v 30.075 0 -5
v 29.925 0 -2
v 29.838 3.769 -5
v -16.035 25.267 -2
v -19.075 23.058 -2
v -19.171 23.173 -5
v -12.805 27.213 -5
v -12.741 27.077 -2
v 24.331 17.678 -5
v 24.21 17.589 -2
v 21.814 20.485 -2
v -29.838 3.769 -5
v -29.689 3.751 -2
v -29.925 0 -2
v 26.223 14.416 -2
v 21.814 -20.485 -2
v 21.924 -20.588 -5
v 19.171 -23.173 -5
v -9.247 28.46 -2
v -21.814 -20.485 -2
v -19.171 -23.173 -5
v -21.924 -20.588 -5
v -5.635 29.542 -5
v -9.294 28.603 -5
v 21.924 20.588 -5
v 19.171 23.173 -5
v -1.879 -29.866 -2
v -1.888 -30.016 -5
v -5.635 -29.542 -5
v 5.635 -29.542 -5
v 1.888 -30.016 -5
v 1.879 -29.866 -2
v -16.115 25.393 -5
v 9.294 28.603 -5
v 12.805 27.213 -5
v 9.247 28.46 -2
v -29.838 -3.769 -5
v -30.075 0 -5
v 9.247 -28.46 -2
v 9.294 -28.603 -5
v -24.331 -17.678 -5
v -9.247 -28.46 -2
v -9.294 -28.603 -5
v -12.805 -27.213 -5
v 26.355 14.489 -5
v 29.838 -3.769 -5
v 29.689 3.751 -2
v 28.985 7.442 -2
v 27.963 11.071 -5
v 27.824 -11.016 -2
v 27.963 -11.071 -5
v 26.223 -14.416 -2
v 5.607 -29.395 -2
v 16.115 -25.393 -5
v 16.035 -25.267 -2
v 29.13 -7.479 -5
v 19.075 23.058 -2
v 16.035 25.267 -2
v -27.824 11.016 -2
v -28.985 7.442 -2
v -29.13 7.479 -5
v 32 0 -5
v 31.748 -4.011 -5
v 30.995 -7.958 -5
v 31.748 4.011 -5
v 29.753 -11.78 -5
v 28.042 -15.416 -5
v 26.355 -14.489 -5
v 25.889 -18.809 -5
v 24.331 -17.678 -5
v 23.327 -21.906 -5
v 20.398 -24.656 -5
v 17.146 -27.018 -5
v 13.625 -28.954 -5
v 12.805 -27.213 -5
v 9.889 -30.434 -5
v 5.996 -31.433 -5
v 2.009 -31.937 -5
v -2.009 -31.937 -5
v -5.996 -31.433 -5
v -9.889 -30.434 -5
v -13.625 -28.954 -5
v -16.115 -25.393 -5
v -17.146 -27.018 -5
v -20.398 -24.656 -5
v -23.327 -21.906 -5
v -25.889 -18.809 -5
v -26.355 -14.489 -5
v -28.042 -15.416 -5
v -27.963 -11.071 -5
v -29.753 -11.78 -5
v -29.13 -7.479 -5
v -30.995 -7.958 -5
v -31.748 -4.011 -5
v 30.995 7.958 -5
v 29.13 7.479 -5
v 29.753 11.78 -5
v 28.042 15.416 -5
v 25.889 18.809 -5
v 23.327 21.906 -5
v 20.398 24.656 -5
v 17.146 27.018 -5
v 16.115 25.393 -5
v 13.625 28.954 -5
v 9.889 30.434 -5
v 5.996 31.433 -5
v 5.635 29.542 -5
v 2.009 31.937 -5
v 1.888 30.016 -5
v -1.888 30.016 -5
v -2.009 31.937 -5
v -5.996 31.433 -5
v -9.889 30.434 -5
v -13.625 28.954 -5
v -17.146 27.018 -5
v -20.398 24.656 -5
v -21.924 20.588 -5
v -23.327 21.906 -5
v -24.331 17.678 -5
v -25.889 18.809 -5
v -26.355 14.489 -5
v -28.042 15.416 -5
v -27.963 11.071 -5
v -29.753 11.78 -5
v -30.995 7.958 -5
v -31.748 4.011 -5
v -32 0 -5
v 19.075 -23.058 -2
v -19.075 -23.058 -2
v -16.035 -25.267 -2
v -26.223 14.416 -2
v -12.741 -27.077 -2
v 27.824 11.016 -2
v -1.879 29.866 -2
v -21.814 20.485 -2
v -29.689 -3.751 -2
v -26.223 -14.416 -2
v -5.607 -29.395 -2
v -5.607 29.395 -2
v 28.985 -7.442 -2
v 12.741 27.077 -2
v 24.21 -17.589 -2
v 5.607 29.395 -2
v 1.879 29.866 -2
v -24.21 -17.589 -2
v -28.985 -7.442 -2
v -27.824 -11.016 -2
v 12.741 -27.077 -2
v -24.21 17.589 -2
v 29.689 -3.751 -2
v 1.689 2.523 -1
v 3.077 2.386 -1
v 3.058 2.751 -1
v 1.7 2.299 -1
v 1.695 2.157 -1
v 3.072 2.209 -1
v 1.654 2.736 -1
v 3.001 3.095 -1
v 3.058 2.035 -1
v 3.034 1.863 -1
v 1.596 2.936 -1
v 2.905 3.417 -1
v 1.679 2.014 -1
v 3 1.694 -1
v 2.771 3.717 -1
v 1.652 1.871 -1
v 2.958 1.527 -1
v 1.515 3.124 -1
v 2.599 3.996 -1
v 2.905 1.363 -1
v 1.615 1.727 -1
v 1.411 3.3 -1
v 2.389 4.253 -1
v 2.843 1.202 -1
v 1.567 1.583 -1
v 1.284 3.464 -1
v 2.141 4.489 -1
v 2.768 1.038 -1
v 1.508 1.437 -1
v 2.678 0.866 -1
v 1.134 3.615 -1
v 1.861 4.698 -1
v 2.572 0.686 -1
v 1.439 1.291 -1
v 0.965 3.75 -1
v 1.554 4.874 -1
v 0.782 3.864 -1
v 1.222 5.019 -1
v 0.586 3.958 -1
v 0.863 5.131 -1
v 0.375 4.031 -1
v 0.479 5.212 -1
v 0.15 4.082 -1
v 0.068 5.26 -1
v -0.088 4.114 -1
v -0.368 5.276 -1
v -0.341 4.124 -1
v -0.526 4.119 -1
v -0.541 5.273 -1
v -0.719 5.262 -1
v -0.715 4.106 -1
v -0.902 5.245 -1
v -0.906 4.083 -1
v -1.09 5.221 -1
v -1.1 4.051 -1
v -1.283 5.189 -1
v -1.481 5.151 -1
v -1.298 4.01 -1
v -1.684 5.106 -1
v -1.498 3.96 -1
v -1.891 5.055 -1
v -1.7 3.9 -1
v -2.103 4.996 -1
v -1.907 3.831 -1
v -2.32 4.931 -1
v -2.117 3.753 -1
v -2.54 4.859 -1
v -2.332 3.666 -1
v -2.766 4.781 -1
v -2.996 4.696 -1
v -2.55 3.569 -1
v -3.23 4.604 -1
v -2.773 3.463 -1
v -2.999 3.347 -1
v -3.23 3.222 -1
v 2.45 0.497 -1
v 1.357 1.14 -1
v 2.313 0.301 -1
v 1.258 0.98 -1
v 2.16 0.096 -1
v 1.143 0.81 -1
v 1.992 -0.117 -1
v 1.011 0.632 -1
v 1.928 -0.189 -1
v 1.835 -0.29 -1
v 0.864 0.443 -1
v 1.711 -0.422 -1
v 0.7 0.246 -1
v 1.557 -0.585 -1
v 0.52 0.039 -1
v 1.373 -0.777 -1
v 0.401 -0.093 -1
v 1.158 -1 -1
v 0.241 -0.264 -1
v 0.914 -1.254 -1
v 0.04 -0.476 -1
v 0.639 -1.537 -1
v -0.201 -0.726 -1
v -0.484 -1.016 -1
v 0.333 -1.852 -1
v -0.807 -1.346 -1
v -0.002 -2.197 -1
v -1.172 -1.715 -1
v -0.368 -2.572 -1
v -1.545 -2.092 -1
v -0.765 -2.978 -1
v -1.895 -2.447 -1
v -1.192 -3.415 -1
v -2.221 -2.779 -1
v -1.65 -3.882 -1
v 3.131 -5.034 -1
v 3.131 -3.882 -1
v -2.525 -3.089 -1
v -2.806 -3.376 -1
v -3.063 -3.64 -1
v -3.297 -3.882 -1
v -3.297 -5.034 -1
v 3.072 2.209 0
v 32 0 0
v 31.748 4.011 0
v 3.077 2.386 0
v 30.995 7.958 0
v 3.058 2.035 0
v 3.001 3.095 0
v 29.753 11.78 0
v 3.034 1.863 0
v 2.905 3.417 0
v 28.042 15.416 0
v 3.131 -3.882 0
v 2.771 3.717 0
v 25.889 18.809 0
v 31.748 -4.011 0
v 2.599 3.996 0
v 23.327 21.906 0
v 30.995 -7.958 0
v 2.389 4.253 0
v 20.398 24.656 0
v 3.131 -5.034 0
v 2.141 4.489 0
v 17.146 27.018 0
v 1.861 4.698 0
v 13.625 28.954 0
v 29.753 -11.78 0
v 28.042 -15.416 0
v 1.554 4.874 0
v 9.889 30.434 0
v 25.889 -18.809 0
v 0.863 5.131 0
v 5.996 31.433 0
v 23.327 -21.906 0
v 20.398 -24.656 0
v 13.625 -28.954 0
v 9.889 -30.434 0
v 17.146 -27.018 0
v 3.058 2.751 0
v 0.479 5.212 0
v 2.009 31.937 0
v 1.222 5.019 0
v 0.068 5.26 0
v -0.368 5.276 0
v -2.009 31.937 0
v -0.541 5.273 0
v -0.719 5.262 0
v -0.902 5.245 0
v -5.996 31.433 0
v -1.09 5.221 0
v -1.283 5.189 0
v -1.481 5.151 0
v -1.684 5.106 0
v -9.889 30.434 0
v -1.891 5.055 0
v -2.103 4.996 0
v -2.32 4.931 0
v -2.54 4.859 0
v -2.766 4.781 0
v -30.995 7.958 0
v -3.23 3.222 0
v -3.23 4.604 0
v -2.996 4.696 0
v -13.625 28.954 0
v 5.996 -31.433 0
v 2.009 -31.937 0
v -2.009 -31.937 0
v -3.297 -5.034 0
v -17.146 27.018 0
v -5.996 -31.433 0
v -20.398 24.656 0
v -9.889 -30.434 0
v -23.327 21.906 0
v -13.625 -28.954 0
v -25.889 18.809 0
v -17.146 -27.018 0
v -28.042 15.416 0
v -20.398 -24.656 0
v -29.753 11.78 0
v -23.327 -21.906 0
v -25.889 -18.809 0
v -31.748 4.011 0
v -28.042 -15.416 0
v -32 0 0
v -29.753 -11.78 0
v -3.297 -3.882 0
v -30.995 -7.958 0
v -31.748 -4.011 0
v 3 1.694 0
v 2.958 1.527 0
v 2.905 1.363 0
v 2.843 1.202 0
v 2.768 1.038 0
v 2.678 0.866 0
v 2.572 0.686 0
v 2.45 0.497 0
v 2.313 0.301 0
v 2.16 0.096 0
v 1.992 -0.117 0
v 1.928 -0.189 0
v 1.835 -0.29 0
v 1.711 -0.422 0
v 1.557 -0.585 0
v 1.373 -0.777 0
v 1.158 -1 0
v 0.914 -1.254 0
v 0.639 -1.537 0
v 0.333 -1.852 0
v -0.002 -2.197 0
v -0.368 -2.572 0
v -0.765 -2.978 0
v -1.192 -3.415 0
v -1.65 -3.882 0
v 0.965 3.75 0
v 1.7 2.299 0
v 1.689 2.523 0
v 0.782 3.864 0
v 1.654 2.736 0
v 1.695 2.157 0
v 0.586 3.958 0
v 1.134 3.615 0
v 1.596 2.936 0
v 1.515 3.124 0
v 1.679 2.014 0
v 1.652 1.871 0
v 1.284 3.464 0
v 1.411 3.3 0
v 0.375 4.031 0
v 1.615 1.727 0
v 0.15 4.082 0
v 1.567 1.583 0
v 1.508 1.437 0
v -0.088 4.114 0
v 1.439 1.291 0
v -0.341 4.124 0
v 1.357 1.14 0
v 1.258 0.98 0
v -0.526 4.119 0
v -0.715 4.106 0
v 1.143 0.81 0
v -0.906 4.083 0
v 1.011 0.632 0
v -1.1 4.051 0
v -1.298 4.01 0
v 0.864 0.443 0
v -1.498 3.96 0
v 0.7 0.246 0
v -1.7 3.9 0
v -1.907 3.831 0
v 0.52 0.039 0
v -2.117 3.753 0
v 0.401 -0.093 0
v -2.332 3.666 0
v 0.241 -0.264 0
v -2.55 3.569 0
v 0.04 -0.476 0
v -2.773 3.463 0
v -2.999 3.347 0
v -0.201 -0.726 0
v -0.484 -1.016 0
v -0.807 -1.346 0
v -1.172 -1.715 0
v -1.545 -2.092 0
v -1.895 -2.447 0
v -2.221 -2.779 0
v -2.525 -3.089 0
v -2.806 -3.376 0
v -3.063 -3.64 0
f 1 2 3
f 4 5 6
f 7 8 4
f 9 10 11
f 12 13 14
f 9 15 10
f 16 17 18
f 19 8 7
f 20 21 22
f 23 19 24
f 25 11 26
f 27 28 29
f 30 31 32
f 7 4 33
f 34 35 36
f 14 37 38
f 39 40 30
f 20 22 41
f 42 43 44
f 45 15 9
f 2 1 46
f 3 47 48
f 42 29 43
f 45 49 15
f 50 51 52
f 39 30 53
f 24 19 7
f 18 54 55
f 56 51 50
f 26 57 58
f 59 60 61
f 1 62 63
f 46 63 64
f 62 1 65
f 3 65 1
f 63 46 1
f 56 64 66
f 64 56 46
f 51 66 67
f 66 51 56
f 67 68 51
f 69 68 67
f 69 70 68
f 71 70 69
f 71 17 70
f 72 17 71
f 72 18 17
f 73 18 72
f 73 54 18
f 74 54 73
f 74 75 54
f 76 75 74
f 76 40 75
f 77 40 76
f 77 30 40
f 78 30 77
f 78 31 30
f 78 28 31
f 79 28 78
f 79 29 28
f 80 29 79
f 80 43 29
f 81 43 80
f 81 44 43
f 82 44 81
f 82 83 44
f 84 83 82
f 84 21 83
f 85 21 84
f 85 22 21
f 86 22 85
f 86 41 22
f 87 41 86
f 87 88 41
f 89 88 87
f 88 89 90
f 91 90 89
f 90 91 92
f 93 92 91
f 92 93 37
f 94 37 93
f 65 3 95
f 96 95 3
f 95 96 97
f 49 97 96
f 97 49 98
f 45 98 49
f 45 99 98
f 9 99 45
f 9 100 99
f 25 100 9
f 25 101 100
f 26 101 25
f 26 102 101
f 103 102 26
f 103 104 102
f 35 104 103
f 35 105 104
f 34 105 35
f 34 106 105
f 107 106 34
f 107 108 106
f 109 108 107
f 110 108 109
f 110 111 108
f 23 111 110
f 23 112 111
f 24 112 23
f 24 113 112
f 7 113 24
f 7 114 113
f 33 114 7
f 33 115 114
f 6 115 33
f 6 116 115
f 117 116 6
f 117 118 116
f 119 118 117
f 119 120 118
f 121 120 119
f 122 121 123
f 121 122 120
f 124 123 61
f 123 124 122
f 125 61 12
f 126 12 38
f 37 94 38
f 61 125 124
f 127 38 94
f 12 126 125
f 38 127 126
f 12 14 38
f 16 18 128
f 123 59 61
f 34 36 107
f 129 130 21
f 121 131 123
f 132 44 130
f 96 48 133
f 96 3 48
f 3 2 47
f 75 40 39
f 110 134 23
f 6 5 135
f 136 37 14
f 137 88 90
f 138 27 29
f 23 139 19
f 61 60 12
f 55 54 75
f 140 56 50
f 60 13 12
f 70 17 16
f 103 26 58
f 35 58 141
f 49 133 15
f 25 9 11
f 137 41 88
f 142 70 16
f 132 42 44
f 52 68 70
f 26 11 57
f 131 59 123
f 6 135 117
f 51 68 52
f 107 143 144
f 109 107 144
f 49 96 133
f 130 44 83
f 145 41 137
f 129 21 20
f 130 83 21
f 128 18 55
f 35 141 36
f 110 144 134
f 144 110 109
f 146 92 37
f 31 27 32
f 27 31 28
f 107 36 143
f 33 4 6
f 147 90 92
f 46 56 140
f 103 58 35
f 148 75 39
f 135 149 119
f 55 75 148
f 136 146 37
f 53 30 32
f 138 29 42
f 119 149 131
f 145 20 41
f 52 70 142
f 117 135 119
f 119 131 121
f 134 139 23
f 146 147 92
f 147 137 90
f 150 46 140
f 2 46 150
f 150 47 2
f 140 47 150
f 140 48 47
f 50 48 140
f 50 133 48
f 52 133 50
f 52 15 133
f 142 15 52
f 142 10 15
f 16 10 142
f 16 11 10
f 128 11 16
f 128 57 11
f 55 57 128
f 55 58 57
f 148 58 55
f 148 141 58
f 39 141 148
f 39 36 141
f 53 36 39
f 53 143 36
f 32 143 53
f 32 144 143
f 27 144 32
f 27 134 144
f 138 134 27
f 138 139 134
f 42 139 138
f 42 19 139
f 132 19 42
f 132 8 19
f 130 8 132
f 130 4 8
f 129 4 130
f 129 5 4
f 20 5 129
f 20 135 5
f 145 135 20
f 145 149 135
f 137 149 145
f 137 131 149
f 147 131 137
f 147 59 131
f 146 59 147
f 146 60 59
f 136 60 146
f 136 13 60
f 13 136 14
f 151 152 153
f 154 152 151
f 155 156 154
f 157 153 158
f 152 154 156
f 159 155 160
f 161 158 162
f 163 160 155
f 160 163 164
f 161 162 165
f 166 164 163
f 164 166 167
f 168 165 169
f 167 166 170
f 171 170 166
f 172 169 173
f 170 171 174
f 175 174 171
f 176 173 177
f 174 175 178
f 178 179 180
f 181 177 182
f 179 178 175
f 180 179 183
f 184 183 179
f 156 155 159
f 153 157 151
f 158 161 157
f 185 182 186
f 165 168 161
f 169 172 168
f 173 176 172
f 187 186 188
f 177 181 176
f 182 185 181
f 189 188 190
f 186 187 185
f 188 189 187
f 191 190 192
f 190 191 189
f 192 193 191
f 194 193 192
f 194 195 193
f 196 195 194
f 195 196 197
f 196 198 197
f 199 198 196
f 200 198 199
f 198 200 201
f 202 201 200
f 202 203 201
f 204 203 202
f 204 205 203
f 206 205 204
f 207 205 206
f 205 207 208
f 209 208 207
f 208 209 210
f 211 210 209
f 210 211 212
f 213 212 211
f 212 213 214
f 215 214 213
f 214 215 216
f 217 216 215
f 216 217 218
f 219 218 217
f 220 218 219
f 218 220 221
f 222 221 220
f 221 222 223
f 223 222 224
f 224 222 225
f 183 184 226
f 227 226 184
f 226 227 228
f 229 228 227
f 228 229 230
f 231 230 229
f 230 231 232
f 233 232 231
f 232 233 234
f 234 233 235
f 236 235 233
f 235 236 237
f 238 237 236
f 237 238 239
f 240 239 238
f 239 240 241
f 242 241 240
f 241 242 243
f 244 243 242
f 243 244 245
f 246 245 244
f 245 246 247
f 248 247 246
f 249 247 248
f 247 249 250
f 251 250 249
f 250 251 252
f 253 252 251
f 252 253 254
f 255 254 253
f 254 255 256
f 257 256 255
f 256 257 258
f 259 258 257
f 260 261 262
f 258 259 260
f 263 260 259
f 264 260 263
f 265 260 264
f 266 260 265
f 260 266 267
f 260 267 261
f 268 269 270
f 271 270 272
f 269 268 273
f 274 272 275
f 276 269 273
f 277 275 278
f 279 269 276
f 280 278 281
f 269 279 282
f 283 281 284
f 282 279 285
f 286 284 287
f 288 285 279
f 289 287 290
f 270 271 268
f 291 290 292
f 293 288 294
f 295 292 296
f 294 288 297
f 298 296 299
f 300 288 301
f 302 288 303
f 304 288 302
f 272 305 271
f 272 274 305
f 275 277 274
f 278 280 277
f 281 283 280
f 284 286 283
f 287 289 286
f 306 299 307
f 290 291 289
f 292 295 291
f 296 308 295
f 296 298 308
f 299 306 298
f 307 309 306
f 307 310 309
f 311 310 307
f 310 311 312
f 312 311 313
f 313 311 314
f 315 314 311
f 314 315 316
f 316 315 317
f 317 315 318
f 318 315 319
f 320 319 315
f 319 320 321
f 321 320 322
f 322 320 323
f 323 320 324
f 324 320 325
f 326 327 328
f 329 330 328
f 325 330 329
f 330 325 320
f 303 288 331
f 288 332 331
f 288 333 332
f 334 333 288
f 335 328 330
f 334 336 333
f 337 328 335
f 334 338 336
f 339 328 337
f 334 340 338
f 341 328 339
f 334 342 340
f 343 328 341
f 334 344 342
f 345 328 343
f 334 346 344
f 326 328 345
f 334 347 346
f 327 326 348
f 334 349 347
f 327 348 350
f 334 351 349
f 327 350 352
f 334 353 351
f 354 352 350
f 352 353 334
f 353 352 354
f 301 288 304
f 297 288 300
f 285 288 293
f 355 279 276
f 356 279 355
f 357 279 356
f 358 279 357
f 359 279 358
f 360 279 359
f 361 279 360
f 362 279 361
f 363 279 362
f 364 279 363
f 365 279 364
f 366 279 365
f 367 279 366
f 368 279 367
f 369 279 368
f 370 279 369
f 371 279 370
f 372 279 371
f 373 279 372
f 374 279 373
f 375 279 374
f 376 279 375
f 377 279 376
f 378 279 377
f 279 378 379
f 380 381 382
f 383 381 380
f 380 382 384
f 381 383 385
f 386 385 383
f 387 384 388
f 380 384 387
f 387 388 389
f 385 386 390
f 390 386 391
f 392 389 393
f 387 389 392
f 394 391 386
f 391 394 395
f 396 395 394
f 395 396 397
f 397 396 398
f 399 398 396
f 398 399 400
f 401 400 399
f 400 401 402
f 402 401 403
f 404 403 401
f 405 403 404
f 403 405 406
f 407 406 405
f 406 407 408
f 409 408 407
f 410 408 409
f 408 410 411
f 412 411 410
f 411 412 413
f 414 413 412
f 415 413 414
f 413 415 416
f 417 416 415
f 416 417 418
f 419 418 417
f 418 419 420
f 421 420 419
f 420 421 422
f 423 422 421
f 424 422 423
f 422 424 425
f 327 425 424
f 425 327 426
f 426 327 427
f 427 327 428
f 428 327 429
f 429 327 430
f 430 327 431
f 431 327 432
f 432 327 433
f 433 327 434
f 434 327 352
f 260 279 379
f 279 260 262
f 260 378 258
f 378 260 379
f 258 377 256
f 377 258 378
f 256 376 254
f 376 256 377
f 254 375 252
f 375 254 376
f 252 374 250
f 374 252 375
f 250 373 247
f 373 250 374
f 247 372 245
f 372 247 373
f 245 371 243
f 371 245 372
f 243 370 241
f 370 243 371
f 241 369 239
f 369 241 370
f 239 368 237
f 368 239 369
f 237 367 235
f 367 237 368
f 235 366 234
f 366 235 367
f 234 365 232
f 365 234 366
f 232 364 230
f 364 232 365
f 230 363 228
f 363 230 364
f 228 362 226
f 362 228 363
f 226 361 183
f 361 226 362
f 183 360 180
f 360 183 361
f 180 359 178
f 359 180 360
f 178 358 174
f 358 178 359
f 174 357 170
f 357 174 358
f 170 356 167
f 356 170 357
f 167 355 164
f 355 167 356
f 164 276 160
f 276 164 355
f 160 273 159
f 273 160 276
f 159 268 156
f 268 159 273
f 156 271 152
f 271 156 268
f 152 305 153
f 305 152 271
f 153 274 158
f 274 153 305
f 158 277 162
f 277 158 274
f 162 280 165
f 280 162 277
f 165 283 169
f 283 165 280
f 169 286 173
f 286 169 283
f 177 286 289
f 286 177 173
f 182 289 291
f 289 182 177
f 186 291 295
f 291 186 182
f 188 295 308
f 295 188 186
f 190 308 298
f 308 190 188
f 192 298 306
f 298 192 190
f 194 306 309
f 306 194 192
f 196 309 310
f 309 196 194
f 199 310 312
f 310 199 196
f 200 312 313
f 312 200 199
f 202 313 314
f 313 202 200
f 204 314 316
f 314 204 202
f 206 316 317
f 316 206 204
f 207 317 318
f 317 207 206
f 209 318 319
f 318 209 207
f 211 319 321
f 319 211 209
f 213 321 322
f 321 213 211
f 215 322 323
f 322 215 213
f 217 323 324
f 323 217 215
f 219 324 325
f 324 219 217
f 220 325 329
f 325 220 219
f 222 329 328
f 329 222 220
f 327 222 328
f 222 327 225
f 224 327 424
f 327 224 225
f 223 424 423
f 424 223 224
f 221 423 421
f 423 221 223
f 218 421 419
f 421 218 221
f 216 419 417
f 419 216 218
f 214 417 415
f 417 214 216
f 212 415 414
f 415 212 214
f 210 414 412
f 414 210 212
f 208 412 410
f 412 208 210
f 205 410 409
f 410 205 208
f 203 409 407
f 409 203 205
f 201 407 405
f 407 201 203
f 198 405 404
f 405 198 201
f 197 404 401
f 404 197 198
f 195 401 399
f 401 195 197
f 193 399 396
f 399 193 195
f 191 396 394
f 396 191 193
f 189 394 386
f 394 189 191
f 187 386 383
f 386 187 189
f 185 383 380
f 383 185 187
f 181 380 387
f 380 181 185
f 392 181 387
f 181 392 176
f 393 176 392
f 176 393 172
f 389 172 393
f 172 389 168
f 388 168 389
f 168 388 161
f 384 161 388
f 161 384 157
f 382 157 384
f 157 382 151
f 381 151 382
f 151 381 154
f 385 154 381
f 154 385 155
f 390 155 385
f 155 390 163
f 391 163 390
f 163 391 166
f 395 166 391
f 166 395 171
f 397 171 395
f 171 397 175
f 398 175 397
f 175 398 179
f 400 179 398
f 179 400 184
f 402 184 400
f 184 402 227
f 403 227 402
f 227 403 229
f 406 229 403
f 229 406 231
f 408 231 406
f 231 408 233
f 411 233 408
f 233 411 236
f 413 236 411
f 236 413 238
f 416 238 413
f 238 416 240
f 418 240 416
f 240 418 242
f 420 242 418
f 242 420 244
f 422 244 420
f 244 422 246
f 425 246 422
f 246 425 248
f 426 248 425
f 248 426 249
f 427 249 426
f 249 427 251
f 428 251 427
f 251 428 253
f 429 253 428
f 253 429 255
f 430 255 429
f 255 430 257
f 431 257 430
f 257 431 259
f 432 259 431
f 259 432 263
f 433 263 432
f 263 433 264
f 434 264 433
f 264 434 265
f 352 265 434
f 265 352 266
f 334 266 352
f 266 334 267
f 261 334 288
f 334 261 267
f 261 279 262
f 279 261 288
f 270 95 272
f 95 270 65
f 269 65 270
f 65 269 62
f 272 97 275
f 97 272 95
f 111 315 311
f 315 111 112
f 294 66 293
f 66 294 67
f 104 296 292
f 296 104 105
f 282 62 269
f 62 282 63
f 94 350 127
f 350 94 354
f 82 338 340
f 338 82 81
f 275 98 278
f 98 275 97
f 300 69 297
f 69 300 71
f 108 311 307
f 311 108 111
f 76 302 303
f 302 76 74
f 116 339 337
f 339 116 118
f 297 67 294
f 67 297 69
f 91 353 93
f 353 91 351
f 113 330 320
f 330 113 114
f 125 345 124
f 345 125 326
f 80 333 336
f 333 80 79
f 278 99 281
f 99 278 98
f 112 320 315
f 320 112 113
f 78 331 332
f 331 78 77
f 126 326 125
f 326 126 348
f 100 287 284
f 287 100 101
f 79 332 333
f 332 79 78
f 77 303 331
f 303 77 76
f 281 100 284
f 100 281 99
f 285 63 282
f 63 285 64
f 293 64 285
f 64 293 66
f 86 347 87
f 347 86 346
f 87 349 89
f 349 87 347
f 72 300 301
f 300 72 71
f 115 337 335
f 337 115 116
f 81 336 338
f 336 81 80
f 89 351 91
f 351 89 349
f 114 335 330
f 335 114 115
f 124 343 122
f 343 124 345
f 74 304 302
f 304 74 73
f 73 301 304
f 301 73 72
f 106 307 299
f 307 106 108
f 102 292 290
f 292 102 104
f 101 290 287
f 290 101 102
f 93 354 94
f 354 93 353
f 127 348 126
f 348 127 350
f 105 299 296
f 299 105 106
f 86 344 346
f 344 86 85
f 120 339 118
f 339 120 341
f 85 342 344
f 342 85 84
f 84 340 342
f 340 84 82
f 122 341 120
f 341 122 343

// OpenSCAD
$fn = 50;

difference() {
	union() {
		translate(v = [0, 0, -5.0]) {
			cylinder(h = 5, r = 32.0);
		}
	}
	union() {
		#translate(v = [0, 0, -5.0]) {
			cylinder(h = 3, r1 = 30.075, r2 = 29.925);
		}
		translate(v = [0, 0, -1]) {
			linear_extrude(height = 1) {
				text(font = "Impact", halign = "center", size = 10, text = "2", valign = "center");
			}
		}
	}
}
